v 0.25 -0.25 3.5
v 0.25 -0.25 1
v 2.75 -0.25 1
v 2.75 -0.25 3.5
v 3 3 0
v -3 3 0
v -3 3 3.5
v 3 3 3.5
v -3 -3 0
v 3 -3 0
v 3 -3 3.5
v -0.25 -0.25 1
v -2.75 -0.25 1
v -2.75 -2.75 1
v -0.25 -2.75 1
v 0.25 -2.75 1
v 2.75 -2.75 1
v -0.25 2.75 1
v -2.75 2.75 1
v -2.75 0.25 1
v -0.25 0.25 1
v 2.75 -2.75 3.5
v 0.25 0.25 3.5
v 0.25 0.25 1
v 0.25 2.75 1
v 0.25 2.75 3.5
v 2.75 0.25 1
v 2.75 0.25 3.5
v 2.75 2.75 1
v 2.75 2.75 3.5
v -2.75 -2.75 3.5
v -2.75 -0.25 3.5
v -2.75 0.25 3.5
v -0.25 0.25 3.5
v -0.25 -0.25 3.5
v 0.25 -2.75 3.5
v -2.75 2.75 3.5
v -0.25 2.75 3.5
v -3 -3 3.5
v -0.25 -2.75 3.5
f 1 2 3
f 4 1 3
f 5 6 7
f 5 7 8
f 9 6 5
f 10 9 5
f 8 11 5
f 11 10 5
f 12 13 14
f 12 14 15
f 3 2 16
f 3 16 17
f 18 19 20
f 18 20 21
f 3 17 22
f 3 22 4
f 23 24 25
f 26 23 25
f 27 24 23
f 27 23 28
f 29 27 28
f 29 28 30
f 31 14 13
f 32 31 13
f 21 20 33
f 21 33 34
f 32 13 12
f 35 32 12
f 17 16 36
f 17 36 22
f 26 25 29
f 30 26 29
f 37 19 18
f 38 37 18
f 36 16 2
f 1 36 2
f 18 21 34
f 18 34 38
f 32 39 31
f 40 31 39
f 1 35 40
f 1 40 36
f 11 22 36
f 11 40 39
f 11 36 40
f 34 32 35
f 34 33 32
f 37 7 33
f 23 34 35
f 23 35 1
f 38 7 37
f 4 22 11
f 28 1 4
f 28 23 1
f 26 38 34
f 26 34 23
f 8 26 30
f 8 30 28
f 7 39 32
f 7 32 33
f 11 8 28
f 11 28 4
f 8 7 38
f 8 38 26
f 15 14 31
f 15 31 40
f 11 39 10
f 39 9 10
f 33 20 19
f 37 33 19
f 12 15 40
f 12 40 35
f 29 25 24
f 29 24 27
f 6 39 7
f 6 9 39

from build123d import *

# Parameters (mm, degrees)
SKETCH_1_W      = 6
SKETCH_1_H      = 6
EXTRUDE_1_DEPTH = 1
SKETCH_2_W      = 6
SKETCH_2_H      = 6
SKETCH_2_W_2    = 2.5
SKETCH_2_H_2    = 2.5
EXTRUDE_2_DEPTH = 2.5


with BuildPart() as part:
    # 스케치1 → 보스-돌출1 (new body)
    with BuildSketch(Plane.XY):
        Rectangle(SKETCH_1_W, SKETCH_1_H)
    extrude(amount=EXTRUDE_1_DEPTH)

    # 스케치2 → 보스-돌출2 (add)
    with BuildSketch(Plane.XY.offset(1)):
        Rectangle(SKETCH_2_W, SKETCH_2_H)
        with Locations((-1.5, -1.5)):
            Rectangle(SKETCH_2_W_2, SKETCH_2_H_2, mode=Mode.SUBTRACT)
        with Locations((1.5, -1.5)):
            Rectangle(SKETCH_2_W_2, SKETCH_2_H_2, mode=Mode.SUBTRACT)
        with Locations((-1.5, 1.5)):
            Rectangle(SKETCH_2_W_2, SKETCH_2_H_2, mode=Mode.SUBTRACT)
        with Locations((1.5, 1.5)):
            Rectangle(SKETCH_2_W_2, SKETCH_2_H_2, mode=Mode.SUBTRACT)
    extrude(amount=EXTRUDE_2_DEPTH)


solid = part.part
